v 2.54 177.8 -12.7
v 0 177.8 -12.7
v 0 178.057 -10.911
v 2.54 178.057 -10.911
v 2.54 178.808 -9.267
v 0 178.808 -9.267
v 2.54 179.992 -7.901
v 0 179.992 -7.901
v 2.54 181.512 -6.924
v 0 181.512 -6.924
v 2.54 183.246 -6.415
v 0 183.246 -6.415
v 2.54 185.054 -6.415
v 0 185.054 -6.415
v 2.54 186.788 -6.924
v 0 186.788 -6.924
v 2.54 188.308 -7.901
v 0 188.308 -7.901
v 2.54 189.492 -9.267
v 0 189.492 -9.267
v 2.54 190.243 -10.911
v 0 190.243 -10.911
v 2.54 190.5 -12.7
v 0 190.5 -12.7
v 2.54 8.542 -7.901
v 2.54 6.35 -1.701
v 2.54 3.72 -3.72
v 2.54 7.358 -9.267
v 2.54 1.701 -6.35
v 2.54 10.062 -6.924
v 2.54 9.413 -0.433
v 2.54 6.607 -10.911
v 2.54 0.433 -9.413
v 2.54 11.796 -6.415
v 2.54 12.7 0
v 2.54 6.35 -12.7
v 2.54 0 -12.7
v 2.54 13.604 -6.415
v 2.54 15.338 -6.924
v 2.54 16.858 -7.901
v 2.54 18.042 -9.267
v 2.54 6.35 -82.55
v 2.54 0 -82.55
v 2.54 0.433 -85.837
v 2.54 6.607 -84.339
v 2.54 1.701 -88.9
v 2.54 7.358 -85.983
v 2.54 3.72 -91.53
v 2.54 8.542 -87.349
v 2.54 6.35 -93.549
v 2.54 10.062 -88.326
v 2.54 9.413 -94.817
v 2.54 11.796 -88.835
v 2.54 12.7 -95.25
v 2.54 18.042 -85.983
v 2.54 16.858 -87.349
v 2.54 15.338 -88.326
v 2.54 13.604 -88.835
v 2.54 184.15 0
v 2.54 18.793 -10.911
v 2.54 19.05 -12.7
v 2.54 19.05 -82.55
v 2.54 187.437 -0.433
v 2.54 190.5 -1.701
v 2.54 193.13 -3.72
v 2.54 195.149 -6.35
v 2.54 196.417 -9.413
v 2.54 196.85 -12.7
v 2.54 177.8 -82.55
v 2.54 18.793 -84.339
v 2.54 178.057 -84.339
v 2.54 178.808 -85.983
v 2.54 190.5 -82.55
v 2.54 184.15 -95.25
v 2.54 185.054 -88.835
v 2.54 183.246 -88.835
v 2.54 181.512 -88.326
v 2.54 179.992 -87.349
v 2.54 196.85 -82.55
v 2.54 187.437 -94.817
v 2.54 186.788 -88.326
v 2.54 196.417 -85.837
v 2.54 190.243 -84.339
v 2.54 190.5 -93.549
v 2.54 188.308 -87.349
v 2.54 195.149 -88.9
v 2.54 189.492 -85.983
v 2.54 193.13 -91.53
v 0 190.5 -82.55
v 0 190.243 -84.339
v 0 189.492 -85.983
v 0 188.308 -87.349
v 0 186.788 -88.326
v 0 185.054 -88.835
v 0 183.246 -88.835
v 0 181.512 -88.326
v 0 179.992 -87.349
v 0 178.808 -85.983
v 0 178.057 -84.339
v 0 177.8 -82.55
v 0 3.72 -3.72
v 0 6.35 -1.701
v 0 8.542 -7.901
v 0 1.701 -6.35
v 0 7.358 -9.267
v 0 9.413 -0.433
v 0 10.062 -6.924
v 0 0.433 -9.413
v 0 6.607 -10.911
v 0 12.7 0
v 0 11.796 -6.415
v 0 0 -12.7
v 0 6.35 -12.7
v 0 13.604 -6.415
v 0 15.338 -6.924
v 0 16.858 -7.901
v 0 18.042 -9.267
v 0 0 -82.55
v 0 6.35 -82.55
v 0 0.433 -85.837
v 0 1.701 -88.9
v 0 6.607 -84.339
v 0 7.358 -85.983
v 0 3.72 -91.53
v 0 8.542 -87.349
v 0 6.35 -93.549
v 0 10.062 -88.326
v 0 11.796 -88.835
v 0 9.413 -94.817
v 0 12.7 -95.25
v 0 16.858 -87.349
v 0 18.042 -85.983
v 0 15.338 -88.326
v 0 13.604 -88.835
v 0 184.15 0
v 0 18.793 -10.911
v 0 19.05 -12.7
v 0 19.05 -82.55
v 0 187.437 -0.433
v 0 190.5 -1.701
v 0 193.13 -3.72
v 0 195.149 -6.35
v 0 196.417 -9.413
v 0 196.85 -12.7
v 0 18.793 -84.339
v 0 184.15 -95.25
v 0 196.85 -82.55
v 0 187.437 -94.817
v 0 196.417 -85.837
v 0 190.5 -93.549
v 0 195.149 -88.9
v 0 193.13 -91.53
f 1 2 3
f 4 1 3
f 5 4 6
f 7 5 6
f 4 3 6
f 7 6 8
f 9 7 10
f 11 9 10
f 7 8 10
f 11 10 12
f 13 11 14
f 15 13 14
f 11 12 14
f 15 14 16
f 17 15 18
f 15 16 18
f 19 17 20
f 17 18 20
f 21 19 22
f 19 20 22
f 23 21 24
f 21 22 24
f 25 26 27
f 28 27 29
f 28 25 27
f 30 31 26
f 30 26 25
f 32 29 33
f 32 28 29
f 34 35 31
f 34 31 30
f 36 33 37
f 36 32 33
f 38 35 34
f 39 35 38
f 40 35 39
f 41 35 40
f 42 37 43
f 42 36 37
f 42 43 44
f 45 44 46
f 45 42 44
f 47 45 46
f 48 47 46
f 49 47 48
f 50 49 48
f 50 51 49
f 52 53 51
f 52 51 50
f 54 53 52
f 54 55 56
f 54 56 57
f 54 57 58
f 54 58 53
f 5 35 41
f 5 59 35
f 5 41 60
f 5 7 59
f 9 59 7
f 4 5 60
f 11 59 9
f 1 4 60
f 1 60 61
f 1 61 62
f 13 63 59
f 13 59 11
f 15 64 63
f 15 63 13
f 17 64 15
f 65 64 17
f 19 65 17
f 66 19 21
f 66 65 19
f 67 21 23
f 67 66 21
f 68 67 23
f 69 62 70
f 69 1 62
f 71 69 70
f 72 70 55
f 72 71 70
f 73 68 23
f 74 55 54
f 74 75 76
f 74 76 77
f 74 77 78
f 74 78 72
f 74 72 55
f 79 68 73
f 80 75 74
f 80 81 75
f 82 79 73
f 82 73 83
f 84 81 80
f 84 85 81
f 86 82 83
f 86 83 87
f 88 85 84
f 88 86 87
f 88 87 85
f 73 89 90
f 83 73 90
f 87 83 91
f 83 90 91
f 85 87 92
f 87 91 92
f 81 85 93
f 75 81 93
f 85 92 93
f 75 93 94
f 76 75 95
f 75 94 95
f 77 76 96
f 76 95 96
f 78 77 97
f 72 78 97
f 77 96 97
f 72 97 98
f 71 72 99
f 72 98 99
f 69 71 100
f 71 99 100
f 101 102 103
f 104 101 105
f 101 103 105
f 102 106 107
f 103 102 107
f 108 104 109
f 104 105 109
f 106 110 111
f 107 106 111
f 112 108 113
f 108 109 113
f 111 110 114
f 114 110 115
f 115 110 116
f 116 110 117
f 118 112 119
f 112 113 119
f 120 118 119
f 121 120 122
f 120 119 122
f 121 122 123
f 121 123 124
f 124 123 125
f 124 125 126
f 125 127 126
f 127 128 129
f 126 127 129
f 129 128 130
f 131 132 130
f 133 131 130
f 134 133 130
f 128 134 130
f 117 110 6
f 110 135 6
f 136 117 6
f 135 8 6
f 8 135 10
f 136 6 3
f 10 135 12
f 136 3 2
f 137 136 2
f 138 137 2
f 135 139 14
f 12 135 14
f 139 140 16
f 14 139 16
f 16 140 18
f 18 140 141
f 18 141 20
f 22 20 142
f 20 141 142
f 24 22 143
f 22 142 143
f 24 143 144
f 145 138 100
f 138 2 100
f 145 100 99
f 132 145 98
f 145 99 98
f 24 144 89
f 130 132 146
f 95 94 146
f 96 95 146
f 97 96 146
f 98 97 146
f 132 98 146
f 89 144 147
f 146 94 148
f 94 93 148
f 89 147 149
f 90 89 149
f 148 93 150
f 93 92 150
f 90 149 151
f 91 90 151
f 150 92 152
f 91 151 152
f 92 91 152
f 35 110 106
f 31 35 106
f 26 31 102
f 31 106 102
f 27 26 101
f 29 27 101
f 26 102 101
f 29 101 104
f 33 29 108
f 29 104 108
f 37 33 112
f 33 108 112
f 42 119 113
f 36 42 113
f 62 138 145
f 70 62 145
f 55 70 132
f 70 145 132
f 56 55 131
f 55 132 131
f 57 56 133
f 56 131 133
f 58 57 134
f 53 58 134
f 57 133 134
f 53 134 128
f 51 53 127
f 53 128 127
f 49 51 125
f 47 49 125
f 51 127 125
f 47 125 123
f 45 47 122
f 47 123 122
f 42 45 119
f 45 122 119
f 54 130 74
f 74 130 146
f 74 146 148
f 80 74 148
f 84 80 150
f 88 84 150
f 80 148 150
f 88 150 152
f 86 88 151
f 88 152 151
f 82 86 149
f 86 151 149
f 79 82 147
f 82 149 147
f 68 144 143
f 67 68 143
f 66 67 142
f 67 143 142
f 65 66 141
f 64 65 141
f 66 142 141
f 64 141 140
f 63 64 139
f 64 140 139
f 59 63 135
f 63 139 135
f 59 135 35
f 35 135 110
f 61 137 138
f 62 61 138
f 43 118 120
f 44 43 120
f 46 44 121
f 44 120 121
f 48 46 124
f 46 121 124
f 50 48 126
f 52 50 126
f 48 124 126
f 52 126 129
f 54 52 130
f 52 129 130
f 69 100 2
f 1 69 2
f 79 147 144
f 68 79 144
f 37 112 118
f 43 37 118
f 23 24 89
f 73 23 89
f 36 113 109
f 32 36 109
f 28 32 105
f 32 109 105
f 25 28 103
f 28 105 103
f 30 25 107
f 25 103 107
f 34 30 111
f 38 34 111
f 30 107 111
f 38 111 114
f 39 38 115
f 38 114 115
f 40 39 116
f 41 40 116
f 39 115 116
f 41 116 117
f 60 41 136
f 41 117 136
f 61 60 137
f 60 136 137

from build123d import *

# Parameters (mm, degrees)
BOSS_EXTRUDE1_DEPTH = 2.54


with BuildPart() as part:
    # Sketch1 → Boss-Extrude1 (new body)
    with BuildSketch(Plane(origin=(0, 0, 0), x_dir=(0, 0, -1), z_dir=(1, 0, 0))):
        with BuildLine():
            Line((12.7, 0), (82.55, 0))
            ThreePointArc((82.55, 0), (91.530256121, 3.719743879), (95.25, 12.7))
            Line((95.25, 12.7), (95.25, 184.15))
            ThreePointArc((95.25, 184.15), (91.530256121, 193.130256121), (82.55, 196.85))
            Line((82.55, 196.85), (12.7, 196.85))
            ThreePointArc((12.7, 196.85), (3.719743879, 193.130256121), (0, 184.15))
            Line((0, 184.15), (0, 12.7))
            ThreePointArc((0, 12.7), (3.719743879, 3.719743879), (12.7, 0))
        make_face()
        with BuildLine():
            Line((82.55, 6.35), (12.7, 6.35))
            ThreePointArc((12.7, 6.35), (6.35, 12.7), (12.7, 19.05))
            Line((12.7, 19.05), (82.55, 19.05))
            ThreePointArc((82.55, 19.05), (88.9, 12.7), (82.55, 6.35))
        make_face(mode=Mode.SUBTRACT)
        with BuildLine():
            Line((82.55, 177.8), (12.7, 177.8))
            ThreePointArc((12.7, 177.8), (6.35, 184.15), (12.7, 190.5))
            Line((12.7, 190.5), (82.55, 190.5))
            ThreePointArc((82.55, 190.5), (88.9, 184.15), (82.55, 177.8))
        make_face(mode=Mode.SUBTRACT)
    extrude(amount=BOSS_EXTRUDE1_DEPTH)


solid = part.part
